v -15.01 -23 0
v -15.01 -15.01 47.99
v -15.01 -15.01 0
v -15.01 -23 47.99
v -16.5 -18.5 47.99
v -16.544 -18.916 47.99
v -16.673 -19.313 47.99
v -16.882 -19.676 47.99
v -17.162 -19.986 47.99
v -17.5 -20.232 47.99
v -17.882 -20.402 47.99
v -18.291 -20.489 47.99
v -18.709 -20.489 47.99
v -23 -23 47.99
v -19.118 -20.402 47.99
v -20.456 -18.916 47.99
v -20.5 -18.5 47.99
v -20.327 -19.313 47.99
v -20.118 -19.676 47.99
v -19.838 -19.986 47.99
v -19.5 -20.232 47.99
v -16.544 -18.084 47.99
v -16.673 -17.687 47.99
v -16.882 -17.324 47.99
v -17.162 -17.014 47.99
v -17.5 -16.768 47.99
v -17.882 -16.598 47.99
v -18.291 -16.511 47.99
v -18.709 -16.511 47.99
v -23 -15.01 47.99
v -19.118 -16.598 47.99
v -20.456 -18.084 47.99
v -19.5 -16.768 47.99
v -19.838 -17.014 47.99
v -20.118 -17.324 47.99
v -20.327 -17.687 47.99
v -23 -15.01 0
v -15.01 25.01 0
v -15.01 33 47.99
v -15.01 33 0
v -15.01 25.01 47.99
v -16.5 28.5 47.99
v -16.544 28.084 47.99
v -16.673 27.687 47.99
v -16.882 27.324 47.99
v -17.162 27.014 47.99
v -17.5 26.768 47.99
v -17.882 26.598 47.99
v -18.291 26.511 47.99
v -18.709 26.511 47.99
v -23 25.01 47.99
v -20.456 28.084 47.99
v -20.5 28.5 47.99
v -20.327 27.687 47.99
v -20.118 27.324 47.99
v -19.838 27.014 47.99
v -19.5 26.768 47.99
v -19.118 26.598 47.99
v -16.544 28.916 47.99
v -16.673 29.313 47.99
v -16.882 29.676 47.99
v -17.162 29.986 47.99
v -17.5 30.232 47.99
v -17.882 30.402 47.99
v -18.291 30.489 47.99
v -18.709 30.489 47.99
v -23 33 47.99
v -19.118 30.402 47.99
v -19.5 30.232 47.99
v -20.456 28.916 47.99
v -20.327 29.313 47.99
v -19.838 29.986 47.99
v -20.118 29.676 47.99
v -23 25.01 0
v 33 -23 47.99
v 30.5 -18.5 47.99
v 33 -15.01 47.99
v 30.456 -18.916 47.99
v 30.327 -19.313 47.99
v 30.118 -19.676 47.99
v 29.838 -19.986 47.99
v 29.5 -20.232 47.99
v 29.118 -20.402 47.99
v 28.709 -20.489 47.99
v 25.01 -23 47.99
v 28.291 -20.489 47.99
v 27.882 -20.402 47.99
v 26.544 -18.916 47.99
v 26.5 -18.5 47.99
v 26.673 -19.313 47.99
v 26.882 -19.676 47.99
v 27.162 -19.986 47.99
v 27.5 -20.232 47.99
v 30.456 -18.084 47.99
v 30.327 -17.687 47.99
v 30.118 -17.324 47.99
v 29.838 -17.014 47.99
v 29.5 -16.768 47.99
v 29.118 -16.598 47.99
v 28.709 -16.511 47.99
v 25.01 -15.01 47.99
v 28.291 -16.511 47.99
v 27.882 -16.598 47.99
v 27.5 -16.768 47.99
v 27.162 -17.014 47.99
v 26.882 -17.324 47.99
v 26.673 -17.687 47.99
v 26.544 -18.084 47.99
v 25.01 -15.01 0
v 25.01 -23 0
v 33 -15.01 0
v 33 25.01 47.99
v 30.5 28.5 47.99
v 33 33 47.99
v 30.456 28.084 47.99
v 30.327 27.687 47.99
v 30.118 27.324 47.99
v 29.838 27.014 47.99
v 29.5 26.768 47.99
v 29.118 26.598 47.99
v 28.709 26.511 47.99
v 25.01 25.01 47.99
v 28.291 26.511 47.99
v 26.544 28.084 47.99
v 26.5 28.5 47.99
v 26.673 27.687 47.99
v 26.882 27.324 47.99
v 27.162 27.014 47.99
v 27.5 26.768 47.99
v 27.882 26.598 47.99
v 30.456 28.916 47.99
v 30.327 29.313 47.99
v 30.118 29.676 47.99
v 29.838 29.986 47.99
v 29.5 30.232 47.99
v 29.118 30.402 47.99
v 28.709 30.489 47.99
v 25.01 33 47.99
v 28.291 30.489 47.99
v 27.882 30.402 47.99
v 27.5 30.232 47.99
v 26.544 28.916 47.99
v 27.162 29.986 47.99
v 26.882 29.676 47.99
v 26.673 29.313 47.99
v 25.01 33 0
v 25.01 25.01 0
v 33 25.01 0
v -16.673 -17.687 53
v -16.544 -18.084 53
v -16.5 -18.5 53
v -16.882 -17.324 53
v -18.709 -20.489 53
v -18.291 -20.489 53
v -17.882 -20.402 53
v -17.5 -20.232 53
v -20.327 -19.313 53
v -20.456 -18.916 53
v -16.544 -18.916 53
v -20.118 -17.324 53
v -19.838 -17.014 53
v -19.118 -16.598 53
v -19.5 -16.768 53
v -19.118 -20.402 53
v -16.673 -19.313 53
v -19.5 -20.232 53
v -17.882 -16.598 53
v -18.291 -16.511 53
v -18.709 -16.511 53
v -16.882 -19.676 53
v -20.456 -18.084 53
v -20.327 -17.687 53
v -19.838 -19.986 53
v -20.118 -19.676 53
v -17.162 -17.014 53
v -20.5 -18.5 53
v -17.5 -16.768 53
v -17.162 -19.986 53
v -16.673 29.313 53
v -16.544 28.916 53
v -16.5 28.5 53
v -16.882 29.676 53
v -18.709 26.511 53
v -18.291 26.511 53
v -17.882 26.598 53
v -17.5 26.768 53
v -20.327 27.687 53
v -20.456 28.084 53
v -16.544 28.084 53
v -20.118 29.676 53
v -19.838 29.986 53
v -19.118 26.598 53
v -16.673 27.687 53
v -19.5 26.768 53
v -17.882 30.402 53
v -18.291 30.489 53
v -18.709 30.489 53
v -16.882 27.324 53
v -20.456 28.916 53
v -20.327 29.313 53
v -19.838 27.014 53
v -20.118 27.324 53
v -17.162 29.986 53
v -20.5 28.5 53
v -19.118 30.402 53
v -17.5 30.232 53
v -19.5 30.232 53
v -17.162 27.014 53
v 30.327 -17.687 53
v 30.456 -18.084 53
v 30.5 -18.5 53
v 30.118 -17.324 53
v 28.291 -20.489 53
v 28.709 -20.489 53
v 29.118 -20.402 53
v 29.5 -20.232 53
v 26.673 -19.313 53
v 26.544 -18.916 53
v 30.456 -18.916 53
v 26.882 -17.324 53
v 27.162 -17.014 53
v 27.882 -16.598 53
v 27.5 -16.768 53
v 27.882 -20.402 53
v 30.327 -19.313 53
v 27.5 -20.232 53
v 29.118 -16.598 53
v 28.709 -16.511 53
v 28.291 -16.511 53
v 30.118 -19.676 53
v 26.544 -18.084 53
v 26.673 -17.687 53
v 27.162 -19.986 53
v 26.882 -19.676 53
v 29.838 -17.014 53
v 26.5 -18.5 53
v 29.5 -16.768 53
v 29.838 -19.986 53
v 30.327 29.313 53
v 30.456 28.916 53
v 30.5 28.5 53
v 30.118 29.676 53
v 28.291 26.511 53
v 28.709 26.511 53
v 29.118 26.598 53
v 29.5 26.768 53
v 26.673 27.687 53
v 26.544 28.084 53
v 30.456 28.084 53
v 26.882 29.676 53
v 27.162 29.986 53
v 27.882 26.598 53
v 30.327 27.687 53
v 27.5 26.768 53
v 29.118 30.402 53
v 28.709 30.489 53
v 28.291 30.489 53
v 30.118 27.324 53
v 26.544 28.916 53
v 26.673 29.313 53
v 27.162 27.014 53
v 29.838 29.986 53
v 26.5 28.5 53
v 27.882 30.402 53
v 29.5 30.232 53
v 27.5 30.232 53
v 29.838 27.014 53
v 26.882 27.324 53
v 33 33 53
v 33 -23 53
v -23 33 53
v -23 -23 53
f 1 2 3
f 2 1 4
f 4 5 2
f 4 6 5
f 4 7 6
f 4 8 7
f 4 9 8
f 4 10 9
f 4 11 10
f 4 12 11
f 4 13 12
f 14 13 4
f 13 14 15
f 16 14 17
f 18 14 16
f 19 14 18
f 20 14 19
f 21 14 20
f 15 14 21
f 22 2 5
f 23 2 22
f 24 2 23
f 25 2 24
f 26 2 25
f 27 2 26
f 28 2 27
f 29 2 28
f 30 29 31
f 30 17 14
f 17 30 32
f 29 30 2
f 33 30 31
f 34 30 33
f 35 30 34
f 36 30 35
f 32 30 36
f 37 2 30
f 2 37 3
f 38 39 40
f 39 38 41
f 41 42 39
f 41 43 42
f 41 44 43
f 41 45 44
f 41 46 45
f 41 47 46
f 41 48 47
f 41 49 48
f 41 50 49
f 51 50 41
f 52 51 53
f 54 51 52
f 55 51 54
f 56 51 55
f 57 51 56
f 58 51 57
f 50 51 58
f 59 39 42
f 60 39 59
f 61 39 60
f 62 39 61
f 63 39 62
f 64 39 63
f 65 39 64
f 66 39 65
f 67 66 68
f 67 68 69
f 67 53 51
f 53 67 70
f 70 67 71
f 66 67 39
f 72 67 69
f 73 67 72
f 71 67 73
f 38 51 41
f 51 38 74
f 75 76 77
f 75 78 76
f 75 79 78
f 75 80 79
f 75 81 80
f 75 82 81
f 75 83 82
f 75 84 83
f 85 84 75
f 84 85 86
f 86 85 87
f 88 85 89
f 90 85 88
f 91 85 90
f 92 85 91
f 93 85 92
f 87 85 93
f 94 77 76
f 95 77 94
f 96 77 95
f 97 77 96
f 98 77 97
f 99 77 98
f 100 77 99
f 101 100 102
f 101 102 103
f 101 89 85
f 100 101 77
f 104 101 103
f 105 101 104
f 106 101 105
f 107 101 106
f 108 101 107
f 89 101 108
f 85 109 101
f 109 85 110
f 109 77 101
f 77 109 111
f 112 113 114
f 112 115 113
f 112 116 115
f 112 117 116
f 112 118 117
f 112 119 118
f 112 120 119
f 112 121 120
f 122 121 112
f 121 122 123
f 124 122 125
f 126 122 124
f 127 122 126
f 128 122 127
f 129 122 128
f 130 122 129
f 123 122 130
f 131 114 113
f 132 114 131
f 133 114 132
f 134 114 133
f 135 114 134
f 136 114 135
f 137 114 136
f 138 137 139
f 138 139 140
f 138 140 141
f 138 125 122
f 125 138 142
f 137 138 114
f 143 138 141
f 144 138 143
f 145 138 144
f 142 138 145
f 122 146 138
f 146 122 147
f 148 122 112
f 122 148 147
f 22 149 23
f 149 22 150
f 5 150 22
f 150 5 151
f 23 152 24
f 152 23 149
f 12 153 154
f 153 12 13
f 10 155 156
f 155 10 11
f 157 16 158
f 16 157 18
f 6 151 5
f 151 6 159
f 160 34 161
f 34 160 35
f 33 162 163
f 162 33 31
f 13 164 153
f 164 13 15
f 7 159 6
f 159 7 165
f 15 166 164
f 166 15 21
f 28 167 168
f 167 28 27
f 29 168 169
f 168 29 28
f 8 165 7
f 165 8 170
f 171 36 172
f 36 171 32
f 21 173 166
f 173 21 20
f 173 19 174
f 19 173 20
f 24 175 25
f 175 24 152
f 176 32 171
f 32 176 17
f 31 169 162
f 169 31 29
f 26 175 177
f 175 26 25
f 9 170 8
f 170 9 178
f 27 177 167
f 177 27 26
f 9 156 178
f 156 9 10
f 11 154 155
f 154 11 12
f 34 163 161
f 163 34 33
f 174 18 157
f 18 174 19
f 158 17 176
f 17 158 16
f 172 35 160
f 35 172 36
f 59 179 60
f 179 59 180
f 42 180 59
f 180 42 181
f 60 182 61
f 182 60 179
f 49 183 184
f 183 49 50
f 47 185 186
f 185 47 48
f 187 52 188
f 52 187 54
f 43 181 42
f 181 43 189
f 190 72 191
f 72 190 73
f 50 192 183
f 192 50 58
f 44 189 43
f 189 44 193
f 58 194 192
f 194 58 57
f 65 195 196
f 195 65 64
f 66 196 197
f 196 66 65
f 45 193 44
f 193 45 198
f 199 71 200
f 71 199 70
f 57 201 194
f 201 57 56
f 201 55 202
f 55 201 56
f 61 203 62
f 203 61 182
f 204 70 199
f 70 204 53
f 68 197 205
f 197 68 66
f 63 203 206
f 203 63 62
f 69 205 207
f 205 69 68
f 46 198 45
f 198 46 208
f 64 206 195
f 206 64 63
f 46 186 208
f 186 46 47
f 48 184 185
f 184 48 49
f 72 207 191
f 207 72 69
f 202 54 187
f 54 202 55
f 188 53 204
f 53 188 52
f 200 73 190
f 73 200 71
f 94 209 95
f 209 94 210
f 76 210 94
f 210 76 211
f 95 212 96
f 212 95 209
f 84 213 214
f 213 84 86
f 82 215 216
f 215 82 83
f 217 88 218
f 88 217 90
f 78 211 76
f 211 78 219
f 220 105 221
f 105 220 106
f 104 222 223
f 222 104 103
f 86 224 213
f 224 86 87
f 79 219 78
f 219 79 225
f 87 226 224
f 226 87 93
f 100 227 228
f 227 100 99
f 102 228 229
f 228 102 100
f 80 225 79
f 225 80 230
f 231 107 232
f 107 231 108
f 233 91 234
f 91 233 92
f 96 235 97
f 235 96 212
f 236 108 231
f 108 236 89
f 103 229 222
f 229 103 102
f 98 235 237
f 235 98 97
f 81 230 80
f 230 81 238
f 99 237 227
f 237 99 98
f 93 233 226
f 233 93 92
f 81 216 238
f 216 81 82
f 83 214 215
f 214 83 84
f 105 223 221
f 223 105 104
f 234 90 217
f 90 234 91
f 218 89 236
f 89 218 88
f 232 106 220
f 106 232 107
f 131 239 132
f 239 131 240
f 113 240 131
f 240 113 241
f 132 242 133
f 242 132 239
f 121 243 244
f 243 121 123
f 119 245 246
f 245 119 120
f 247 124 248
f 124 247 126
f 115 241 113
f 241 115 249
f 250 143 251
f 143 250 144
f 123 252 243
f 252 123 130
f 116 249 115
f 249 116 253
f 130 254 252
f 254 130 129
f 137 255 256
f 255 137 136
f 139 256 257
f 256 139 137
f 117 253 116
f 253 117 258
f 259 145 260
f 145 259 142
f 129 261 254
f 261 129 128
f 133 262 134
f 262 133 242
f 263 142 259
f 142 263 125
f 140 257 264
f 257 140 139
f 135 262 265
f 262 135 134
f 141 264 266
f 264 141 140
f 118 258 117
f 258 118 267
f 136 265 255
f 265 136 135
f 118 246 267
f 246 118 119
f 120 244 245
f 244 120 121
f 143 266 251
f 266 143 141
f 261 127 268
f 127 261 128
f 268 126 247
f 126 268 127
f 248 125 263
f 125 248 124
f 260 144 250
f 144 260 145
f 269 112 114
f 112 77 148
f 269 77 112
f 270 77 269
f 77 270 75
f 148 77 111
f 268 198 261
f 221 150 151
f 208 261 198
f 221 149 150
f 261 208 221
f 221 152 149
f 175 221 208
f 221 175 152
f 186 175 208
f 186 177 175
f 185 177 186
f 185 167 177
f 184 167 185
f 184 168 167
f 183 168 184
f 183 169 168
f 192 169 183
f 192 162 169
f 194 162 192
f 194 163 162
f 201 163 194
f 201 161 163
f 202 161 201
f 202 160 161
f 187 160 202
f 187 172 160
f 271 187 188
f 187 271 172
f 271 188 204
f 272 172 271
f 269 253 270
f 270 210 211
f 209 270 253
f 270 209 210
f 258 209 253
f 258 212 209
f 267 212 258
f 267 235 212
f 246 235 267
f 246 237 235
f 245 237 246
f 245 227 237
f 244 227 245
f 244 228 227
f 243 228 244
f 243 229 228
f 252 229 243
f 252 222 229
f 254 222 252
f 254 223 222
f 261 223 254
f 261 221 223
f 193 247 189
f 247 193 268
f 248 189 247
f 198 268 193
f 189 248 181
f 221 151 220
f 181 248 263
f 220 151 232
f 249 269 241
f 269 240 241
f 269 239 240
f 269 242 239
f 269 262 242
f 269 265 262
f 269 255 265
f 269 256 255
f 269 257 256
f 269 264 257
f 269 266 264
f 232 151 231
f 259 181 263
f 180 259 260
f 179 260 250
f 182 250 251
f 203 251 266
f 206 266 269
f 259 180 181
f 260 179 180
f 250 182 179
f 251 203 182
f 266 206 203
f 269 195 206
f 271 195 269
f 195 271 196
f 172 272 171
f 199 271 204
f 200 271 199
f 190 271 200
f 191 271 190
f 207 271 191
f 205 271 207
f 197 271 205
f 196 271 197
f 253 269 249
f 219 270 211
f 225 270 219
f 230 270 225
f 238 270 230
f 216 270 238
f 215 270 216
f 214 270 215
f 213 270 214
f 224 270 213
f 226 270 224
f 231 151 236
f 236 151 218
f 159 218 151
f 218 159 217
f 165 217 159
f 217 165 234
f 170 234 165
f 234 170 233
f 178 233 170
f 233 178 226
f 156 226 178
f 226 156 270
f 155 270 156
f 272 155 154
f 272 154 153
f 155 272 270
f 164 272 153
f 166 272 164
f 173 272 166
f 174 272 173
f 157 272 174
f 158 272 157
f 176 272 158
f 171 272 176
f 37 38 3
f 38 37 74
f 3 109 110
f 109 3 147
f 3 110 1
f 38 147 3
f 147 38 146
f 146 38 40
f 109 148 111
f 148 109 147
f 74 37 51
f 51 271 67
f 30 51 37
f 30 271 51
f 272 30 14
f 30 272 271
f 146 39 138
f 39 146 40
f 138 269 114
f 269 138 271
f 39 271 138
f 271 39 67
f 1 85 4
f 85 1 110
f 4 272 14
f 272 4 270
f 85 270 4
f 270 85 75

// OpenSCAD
motor();
module motor(){
  difference(){
    translate([-23,-23]) difference() {
      cube([56,56,53]);
      for(x=[-0.01,48.01],y=[-.01,48.01])
        translate([x,y,-.01]) cube([8,8,48]);
      for(x=[4.5,51.5],y=[4.5,51.5])
        translate([x,y,46.99]) cylinder(d=4,h=6.02,$fn=30);
    }
  }
}
module mount(){
}
module cap() {
difference(){
  union(){
    cylinder(d=14,h=10,$fn=50);
    translate([0,-1]) cube([10,2,10]);
  }
  translate([0,0,-.01]) {
    cylinder(d=8.5,h=10.02,$fn=60);
    for(r=[1:16]) rotate([0,0,r*(360/16)])
      rotate_extrude(angle=360/16/2) translate([4.2,0]) square([.8,10.02]);
  }
}
}
